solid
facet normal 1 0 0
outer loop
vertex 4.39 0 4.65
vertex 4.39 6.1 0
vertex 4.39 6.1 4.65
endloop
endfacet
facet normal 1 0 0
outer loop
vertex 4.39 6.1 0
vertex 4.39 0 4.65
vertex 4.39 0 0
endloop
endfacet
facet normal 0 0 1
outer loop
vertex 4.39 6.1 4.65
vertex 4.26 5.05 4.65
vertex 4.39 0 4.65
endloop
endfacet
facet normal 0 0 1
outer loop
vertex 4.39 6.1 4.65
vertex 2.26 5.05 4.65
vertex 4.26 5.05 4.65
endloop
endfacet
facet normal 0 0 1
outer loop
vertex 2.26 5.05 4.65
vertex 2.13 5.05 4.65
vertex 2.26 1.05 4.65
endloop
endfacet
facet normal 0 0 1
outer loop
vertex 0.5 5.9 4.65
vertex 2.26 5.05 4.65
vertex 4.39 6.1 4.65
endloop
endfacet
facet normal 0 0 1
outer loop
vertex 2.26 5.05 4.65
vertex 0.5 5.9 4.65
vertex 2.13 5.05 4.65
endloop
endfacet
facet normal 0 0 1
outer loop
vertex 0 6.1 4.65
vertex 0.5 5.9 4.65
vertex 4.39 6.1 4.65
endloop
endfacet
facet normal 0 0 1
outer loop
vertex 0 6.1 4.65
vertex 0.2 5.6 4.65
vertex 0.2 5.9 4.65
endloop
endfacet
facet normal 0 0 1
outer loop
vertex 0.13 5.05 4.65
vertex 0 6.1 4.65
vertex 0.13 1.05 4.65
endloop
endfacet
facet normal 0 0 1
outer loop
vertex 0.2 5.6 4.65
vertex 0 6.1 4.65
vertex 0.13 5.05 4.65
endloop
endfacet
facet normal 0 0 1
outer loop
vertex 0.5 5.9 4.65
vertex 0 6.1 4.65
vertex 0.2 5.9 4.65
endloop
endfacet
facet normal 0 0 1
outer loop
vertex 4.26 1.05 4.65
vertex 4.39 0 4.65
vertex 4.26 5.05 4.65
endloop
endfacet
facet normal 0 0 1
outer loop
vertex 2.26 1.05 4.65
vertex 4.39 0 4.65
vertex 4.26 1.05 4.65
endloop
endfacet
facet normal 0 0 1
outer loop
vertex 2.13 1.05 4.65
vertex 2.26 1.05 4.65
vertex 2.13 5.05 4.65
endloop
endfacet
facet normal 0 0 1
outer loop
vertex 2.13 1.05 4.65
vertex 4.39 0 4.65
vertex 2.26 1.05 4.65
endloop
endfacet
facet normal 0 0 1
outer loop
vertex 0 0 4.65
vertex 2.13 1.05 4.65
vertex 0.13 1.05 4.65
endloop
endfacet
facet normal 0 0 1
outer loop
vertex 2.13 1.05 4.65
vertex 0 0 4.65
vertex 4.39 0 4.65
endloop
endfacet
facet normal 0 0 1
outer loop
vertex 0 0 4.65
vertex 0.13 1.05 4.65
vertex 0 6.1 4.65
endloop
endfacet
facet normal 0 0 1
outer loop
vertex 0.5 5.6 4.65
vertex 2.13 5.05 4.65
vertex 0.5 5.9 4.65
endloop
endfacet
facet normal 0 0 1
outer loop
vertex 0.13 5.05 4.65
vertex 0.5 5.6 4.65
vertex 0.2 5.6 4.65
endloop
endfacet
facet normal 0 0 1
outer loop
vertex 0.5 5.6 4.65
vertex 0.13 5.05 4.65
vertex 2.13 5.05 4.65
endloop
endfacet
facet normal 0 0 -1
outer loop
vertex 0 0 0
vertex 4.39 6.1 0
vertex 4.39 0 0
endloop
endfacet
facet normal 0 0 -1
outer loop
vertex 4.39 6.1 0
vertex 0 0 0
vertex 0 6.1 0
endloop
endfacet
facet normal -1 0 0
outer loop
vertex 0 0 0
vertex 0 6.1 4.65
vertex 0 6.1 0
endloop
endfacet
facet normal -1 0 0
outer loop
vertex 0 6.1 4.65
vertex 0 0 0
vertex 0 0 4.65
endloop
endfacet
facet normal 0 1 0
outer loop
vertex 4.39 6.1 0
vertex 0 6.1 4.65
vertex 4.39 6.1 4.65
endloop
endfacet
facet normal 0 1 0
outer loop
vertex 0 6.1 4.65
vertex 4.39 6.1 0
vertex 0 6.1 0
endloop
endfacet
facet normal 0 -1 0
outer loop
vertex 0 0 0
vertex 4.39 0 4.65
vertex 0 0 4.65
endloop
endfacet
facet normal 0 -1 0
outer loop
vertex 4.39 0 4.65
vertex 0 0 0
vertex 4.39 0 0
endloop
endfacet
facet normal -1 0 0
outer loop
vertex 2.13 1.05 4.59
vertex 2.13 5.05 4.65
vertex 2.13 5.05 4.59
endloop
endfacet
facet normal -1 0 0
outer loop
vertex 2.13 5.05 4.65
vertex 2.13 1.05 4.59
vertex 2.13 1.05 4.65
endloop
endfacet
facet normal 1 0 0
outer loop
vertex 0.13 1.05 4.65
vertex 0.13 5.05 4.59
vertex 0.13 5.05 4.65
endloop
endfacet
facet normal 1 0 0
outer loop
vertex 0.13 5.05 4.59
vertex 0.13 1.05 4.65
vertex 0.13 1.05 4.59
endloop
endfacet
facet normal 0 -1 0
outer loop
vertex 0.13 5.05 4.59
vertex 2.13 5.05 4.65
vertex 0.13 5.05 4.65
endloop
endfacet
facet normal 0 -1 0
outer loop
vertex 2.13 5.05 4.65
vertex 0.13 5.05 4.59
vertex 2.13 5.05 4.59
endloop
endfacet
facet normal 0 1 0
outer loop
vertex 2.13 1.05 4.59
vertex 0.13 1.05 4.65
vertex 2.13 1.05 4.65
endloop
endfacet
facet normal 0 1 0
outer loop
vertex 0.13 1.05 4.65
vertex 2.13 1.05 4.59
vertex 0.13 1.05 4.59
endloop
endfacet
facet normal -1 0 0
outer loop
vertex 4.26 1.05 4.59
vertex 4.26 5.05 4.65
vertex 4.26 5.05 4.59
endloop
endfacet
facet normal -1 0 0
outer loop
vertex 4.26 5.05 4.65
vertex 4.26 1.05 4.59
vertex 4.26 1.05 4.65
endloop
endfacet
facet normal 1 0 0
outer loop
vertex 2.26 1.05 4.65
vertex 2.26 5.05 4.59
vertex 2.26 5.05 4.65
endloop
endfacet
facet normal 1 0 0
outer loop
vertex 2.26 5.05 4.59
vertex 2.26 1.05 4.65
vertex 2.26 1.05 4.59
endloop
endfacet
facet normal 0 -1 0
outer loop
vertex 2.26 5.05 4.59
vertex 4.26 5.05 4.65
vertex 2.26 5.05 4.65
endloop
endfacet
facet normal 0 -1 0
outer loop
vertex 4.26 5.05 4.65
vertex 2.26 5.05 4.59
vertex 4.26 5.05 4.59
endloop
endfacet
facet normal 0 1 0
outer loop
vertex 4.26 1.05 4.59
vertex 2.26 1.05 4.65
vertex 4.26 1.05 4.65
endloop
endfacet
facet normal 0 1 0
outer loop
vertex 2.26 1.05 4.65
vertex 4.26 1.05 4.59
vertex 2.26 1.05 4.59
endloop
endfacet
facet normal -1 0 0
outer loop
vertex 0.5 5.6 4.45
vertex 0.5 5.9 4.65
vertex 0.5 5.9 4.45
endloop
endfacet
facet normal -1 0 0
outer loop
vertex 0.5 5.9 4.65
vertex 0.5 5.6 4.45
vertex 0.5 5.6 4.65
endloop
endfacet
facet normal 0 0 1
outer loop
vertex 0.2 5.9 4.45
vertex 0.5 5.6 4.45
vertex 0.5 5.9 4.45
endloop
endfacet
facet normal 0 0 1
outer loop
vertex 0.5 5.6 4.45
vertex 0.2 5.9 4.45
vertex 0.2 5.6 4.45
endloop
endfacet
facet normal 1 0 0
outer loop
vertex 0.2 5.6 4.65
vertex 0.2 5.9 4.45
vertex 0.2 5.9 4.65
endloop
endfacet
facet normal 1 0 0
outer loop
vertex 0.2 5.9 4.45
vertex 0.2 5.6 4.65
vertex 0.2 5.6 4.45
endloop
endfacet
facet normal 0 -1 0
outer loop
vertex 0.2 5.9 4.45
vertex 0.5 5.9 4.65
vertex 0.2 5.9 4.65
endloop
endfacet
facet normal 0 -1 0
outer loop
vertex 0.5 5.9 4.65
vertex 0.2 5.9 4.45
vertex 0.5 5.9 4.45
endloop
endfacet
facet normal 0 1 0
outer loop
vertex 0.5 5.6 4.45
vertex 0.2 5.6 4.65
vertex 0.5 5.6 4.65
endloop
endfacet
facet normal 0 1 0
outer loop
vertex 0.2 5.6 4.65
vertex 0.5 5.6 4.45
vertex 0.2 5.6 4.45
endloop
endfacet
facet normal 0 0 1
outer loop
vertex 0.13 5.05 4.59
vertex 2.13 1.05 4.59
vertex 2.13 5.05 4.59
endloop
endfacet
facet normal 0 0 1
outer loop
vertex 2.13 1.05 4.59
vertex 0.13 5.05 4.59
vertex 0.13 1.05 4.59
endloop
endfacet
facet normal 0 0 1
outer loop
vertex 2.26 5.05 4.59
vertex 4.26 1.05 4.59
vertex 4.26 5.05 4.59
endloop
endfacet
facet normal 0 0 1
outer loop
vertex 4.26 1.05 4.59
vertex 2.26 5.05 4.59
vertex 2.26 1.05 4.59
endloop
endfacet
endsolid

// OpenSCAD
// file: reflective-sensor.scad
//   by: Daniel Peirce B.Sc. 2014 CC0 v1.0
//  CC0 places this file in the public domain
//
// The reflctive sensor is a QRD1114
// pin 1 collecter  mark indicats pin 1
// pin 2 emitter
// pin 3 anode
// pin 4 cathode

function r_sensor_dim() = [4.39, 6.10, 4.65];

module r_sensor(dim)
{
  win_dim = [2,4,4];
  difference()
  {
    color("black") cube(dim);
    translate([dim[0]/3-win_dim[0]*2/3,dim[1]/2-win_dim[1]/2,1])
    {
      cube(win_dim);
    }
    translate([(dim[0]-win_dim[0]*2)/3*2+win_dim[0],dim[1]/2-win_dim[1]/2,1])
    {
      cube(win_dim);
    }
    translate([0.2,dim[1]-0.5, dim[2]-0.2]) color("black", 0.5) cube([0.3,0.3,0.3]);
  }
  translate([dim[0]/3-win_dim[0]*2/3,dim[1]/2-win_dim[1]/2,1])
  {
    color("darkred") cube([win_dim[0],win_dim[1],win_dim[2]-0.41]);
  }
  translate([(dim[0]-win_dim[0]*2)/3*2+win_dim[0],dim[1]/2-win_dim[1]/2,1])
  {
    color("aqua", 0.2) cube([win_dim[0],win_dim[1],win_dim[2]-0.41]);
  }
}

r_sensor(r_sensor_dim());
